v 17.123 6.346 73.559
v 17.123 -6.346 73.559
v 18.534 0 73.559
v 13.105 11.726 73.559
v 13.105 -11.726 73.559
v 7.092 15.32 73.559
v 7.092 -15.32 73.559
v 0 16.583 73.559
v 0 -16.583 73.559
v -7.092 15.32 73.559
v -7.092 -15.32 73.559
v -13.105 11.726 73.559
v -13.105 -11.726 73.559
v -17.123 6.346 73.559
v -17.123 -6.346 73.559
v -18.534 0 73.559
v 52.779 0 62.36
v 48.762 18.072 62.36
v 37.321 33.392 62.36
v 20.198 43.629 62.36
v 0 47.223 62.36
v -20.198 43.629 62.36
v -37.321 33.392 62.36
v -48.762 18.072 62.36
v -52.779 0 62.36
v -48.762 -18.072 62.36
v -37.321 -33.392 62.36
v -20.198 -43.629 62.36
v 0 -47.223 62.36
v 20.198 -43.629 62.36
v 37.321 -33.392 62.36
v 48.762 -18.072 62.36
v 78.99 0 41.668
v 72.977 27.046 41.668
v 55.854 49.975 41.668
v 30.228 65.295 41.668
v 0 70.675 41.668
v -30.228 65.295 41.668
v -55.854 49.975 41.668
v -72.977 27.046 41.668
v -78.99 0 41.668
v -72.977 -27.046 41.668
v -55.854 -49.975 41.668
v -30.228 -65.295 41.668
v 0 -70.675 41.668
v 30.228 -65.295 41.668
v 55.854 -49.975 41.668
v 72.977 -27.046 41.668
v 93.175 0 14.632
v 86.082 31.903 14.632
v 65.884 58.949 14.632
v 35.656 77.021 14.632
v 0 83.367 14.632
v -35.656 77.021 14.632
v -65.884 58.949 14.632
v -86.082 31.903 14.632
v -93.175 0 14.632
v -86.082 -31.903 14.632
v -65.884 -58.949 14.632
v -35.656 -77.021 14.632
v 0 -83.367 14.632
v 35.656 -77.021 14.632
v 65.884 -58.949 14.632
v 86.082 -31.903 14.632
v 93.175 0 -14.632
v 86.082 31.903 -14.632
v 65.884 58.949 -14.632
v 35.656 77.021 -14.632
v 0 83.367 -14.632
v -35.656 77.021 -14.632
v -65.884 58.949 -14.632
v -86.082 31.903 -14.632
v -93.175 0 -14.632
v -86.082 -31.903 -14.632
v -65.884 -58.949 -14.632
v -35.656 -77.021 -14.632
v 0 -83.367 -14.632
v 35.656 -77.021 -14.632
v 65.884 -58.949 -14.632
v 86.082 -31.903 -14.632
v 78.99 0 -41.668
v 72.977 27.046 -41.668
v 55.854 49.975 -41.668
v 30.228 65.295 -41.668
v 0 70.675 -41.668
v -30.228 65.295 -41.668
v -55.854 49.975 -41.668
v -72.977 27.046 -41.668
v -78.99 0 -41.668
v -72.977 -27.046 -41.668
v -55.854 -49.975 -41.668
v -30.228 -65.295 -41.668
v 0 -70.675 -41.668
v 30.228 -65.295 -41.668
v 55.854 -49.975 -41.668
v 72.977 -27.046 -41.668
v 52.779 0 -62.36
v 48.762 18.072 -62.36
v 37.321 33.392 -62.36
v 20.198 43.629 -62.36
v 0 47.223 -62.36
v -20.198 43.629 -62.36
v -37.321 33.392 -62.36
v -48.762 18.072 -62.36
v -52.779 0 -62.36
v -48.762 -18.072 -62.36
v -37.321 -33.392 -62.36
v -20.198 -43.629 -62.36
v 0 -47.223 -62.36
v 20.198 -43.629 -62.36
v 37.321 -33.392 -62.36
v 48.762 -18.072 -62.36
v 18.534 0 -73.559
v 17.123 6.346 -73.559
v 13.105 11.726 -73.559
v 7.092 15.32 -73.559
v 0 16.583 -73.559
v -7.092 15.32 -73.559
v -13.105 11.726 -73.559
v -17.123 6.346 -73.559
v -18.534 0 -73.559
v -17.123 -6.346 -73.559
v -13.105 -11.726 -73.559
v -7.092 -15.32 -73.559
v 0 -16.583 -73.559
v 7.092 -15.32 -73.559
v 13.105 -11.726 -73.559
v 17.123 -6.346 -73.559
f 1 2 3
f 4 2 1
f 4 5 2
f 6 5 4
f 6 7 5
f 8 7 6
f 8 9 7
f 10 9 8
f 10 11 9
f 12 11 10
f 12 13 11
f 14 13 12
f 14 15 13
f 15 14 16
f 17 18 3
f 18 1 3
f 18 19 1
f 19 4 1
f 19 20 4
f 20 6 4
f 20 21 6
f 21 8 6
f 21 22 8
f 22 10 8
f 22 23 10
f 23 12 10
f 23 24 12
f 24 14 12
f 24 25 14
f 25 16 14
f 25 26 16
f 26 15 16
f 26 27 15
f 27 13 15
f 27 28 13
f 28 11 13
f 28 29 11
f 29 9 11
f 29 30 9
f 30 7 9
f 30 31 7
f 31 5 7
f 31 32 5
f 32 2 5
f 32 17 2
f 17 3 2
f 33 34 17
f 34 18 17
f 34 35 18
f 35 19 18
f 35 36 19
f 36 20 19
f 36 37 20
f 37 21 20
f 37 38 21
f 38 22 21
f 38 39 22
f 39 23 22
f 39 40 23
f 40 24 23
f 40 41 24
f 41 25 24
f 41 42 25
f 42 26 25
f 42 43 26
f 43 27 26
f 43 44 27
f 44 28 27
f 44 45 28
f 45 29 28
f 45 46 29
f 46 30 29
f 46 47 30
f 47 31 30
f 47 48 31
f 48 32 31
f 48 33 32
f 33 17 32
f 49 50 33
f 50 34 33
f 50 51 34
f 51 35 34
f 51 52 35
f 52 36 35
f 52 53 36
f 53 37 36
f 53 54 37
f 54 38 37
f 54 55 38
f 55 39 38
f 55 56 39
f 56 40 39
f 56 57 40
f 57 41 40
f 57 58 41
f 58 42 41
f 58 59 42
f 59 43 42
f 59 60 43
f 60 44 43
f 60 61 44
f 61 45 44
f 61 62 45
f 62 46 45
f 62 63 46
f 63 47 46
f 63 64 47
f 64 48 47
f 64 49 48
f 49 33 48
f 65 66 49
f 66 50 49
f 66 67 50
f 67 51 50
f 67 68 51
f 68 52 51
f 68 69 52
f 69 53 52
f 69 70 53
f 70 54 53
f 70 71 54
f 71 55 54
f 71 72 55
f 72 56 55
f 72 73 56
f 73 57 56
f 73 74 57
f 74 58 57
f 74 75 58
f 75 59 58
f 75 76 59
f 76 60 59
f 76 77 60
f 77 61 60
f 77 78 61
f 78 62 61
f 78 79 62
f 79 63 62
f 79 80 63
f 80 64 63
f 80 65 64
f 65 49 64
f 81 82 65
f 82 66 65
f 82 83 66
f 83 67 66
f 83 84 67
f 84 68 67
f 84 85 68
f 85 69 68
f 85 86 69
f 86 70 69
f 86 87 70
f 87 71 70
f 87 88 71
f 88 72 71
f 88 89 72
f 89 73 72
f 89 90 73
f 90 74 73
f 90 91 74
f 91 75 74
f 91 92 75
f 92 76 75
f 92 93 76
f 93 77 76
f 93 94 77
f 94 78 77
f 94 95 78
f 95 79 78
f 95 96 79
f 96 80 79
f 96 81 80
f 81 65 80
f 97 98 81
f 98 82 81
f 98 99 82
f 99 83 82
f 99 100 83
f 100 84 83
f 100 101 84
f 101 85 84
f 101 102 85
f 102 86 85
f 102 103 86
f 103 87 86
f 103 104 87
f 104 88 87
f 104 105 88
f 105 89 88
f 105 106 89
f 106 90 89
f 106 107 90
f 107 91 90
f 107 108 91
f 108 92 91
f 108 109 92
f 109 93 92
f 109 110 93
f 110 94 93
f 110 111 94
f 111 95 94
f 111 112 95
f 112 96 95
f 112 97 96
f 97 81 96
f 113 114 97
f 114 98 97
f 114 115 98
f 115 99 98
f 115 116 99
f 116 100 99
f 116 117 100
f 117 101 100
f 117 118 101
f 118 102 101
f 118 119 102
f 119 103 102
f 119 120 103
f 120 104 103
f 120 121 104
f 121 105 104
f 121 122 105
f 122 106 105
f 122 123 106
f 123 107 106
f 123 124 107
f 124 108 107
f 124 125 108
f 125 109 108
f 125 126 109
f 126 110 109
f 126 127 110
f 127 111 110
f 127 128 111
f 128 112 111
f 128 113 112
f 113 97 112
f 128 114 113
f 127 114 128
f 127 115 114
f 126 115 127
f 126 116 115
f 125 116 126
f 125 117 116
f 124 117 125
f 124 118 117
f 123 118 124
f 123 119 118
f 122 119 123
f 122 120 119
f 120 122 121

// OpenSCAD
// Generated by SolidPython 1.0.1 on 2020-07-29 00:46:54


scale(v = [19, 17, 15]) {
	sphere(r = 5);
}
/***********************************************
*********      SolidPython code:      **********
************************************************
 
# import packages: SolidPython
from solid import *
from solid.utils import *
from itertools import chain, combinations, permutations


class Resize:

    def __init__(self, scad_file):
        self.scad_file = scad_file
        #self.scad_file = import_scad(scad_file)
        # cone/cylinder param:
        self.r1 = 0
        self.r2 = 0
        self.h = 0
        # rectangular prism param:
        self.w = 0
        self.l = 0
        # ellipse param:
        self.r = 0

    # import OpenScad code (file name corresponds to shape)


    # classify shape + parameters
    def assign(self, param1, param2, param3):
        if self.scad_file == 'cone.scad':
            self.r1 = param1
            self.r2 = param2
            self.h = param3
        elif self.scad_file == 'cylinder.scad':
            self.r1 = param1
            self.r2 = param2
            self.h = param3
        elif self.scad_file == 'rectangularPrism.scad':
            self.h = param1
            self.l = param2
            self.w = param3
        else:
            self.r = param1
            self.h = param2

    # resize parameters
    def iterate(self):
        x = range(3, 20, 2)
        i = 1
        if self.scad_file == 'cone.scad':
            tempList = list(permutations(x, 2))
            for temp in tempList:
                param1 = temp[0]
                param2 = temp[1]
                filepath = 'produced_scad_files/' + 'cone' + str(param1) + '_' + str(param2) + '_' + '.scad'
                scad_render_to_file(cylinder(h=param1, r1=param2, r2=0), filepath)

        elif self.scad_file == 'cylinder.scad':
            tempList = list(permutations(x, 3))
            for temp in tempList:
                param1 = temp[0]
                param2 = temp[1]
                filepath = 'produced_scad_files/' + 'cylinder' + str(param1) + '_' + str(param2) + '_' + '.scad'
                scad_render_to_file(cylinder(h=param1, r1=param2, r2=param2), filepath)

        elif self.scad_file == 'rectangularPrism.scad':
            tempList = list(permutations(x, 3))
            for temp in tempList:
                param1 = temp[0]
                param2 = temp[1]
                param3 = temp[2]
                filepath = 'produced_scad_files/' + 'rectangularPrism' + str(param1) + '_' + str(param2) + '_' + str(
                    param3) + '.scad'
                scad_render_to_file(cube(size=(param1, param2, param3)), filepath)

        elif self.scad_file == 'ellipse.scad':
            tempList = list(permutations(x, 4))
            for temp in tempList:
                param1 = temp[0]
                param2 = temp[1]
                param3 = temp[2]
                param4 = temp[3]
                filepath = 'produced_scad_files/' + 'ellipse' + str(param1) + '_' + str(param2) + '_' + str(param3) + '_' + str(param4) + '.scad'
                scad_render_to_file(scale([param1, param2, param3])(sphere(r=param4)), filepath)

    def render_to_scadfile(self):
        scad_render_to_file(scad, 'example.scad') 
 
************************************************/
